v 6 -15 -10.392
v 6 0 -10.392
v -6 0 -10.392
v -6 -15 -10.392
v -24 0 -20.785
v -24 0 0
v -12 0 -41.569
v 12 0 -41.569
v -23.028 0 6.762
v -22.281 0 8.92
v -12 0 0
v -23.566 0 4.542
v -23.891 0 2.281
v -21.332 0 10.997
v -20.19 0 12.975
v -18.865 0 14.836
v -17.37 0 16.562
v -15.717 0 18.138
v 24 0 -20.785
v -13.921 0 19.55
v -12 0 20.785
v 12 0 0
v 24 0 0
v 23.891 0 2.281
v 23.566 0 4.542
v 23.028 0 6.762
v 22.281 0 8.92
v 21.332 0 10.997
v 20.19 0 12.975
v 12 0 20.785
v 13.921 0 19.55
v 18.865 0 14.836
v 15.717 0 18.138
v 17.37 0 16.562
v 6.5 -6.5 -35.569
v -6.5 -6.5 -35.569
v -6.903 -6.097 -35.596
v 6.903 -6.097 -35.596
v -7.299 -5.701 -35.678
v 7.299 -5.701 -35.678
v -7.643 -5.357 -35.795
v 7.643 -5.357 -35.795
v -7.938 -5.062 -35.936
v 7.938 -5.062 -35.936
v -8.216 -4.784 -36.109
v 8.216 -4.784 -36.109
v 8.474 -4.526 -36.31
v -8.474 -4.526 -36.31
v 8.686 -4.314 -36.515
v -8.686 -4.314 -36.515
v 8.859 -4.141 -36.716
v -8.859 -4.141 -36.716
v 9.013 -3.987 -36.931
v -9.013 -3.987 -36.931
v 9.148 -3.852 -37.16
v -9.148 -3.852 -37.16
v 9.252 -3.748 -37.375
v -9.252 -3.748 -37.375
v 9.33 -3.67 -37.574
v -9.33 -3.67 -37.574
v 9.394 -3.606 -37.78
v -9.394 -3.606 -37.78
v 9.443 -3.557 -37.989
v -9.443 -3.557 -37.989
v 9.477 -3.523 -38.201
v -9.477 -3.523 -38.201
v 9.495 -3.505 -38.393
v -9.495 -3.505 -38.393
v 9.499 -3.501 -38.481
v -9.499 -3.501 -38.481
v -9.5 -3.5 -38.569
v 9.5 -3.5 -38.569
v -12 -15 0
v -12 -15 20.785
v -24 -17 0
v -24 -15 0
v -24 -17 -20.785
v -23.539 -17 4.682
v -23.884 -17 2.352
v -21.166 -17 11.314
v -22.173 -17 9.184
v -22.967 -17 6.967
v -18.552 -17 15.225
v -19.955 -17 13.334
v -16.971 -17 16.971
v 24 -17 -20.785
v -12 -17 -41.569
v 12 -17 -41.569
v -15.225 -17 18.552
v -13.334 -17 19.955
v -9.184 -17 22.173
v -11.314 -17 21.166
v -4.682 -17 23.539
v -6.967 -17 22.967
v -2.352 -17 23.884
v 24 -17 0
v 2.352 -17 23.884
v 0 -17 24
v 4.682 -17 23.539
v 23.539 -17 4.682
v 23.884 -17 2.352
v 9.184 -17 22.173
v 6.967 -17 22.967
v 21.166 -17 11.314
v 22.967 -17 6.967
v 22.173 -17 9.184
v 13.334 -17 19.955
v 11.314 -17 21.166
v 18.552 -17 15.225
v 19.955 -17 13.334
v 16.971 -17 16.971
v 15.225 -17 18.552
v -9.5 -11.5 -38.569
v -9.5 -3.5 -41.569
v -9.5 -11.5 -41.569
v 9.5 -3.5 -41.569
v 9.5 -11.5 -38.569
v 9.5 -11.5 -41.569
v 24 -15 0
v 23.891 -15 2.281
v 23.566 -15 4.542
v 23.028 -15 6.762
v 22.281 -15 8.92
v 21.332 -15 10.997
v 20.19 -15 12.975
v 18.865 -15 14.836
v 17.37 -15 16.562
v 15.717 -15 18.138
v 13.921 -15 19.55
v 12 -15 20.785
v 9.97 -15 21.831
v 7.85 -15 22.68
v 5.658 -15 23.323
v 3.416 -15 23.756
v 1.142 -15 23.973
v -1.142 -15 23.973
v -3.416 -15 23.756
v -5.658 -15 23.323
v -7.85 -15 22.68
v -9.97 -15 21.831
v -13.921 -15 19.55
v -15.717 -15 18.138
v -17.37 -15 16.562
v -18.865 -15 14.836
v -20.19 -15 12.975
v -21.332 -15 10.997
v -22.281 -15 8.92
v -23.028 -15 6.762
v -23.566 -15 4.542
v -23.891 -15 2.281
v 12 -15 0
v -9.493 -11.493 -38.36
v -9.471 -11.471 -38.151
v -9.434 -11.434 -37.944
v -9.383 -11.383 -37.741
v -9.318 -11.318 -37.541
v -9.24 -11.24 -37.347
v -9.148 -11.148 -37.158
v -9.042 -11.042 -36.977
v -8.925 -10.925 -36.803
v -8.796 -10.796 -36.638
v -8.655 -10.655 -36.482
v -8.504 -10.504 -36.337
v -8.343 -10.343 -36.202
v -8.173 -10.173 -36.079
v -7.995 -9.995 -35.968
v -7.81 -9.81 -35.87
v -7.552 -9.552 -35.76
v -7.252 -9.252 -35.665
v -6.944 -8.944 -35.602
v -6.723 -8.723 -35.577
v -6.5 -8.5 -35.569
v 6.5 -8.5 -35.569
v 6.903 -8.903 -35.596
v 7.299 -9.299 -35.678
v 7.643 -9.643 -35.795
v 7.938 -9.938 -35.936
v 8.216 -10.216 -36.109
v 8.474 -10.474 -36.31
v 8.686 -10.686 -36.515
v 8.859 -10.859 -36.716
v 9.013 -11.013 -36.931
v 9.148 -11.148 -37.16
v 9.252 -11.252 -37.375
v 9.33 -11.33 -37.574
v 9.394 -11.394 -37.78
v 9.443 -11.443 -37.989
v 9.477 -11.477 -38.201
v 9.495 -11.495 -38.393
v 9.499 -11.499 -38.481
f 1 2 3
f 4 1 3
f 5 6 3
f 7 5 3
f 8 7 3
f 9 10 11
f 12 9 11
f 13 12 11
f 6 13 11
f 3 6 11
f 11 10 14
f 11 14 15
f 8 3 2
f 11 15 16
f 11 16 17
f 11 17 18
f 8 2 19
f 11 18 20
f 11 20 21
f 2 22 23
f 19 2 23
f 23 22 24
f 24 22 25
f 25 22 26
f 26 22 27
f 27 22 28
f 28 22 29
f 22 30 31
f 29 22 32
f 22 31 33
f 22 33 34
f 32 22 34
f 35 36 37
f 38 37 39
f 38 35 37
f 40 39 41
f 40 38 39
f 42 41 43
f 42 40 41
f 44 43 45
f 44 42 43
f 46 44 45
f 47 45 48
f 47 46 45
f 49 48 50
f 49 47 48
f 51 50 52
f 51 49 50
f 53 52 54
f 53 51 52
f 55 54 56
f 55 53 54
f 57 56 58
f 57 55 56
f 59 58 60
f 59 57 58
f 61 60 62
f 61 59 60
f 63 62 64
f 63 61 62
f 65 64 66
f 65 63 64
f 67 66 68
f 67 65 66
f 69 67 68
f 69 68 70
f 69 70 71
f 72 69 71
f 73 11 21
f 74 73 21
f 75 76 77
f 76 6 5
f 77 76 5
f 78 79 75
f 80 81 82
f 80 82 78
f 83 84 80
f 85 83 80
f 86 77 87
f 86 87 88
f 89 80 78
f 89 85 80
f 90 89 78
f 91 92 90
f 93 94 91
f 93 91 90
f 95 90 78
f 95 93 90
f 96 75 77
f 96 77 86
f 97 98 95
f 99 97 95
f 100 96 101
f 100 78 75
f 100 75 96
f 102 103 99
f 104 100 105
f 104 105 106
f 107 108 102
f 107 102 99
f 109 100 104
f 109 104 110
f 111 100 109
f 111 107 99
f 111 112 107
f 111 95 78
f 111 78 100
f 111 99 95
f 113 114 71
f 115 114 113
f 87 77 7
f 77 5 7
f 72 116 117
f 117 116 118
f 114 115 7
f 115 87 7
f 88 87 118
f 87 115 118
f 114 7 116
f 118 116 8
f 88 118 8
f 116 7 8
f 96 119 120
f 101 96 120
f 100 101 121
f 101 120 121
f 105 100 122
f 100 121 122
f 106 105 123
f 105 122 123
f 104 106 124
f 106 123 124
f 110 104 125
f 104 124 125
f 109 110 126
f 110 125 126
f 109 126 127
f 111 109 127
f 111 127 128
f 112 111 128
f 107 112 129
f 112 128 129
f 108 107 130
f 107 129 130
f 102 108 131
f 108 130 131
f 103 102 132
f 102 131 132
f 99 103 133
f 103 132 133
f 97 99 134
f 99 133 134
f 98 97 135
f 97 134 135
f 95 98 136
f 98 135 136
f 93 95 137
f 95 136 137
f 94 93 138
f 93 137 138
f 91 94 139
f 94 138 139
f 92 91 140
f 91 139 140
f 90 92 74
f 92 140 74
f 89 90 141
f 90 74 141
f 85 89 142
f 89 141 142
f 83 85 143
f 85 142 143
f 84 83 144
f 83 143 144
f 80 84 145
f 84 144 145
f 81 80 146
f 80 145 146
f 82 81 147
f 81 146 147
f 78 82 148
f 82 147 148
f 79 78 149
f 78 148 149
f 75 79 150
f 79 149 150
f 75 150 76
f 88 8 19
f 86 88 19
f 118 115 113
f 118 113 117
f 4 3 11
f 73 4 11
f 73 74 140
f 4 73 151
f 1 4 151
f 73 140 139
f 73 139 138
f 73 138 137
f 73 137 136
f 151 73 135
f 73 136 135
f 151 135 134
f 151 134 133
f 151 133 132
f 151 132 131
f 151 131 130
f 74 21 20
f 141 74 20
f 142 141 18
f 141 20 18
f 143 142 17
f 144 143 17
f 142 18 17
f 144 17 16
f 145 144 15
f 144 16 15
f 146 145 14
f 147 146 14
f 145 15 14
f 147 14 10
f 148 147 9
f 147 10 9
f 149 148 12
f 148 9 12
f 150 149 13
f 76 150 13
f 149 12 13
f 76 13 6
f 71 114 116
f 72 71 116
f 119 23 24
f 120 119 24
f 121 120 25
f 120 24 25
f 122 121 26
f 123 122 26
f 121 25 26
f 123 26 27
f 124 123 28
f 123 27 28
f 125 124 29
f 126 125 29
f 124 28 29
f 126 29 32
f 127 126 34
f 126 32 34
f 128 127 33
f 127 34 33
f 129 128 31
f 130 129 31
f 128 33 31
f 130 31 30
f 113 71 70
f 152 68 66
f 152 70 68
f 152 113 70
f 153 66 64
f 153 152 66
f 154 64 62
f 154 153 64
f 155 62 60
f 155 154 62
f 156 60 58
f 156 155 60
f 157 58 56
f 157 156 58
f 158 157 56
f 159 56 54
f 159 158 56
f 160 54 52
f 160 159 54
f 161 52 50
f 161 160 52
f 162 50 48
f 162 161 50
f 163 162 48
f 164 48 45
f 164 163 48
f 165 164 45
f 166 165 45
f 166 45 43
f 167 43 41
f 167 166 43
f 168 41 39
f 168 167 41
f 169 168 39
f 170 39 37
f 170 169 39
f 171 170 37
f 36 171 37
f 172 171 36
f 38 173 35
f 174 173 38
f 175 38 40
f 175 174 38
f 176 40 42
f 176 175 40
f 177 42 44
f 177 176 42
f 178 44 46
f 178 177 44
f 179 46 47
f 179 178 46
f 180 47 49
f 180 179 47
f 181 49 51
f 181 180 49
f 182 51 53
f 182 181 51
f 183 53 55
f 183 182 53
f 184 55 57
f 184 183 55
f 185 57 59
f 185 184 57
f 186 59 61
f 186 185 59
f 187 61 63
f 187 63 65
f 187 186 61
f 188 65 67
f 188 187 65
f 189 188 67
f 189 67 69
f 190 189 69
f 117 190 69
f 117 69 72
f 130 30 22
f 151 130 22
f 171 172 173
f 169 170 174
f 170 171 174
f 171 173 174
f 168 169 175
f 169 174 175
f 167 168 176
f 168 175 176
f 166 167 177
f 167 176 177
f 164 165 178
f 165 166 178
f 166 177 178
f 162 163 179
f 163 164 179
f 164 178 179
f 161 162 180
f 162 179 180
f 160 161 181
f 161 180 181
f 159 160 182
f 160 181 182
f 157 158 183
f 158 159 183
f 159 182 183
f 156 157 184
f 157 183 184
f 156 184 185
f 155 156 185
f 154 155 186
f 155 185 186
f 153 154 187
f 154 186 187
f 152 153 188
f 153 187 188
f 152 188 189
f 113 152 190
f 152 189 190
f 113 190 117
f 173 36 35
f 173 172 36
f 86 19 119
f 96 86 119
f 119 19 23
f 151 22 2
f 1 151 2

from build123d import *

# Parameters (mm, degrees)
F1_DEPTH = 15
F2_W     = 19
F2_H     = 8
F3_DEPTH = 6
F5_DEPTH = 2
F6_R     = 3


with BuildPart() as f1:
    # F0 (on Front) → F1 (new body)
    with BuildSketch(Plane.XZ):
        Polygon((24, -20.78461), (18, -10.392305), (12, -20.78461), (-12, -20.78461), (-18, -10.392305), (-24, -20.78461), (-12, -41.569219), (12, -41.569219), align=None)
        Polygon((12, -20.78461), (18, -10.392305), (12, 0), (6, -10.392305), (-6, -10.392305), (-12, 0), (-18, -10.392305), (-12, -20.78461), align=None)
        Polygon((-12, 0), (-12, 20.78461), (-24, 0), (-18, -10.392305), align=None)
        Polygon((18, -10.392305), (24, 0), (12, 20.78461), (12, 0), align=None)
        with BuildLine():
            Line((-24, 0), (-12, 20.78461))
            ThreePointArc((-12, 20.78461), (-20.78461, 12), (-24, 0))
        make_face()
        with BuildLine():
            Line((12, 20.78461), (24, 0))
            ThreePointArc((24, 0), (20.78461, 12), (12, 20.78461))
        make_face()
        Polygon((24, -20.78461), (24, 0), (18, -10.392305), align=None)
        Polygon((-18, -10.392305), (-24, 0), (-24, -20.78461), align=None)
    extrude(amount=F1_DEPTH)

    # F2 (on face) → F3 (cut)
    with BuildSketch(Plane(origin=(0, 0, -41.569219), x_dir=(1, 0, 0), z_dir=(0, 0, -1))):
        with Locations((0, 7.5)):
            Rectangle(F2_W, F2_H)
    extrude(amount=-F3_DEPTH, mode=Mode.SUBTRACT)

    # F4 (on face) → F5 (join)
    with BuildSketch(Plane.XZ.offset(15)):
        with BuildLine():
            ThreePointArc((-24, 0), (0, -24), (24, 0))
            ThreePointArc((24, 0), (0, 24), (-24, 0))
        make_face()
        with BuildLine():
            Line((24, -20.78461), (24, 0))
            ThreePointArc((24, 0), (0, -24), (-24, 0))
            Line((-24, 0), (-24, -20.78461))
            Line((-24, -20.78461), (-12, -41.569219))
            Line((-12, -41.569219), (12, -41.569219))
            Line((12, -41.569219), (24, -20.78461))
        make_face()
    extrude(amount=F5_DEPTH)

    # F6
    f6_edges = [f1.edges().sort_by_distance(p)[0] for p in [
        (0, -3.5, -35.569219),
        (-9.5, -7.5, -35.569219),
        (0, -11.5, -35.569219),
        (9.5, -7.5, -35.569219),
    ]]
    fillet(f6_edges, radius=F6_R)


solid = f1.part
